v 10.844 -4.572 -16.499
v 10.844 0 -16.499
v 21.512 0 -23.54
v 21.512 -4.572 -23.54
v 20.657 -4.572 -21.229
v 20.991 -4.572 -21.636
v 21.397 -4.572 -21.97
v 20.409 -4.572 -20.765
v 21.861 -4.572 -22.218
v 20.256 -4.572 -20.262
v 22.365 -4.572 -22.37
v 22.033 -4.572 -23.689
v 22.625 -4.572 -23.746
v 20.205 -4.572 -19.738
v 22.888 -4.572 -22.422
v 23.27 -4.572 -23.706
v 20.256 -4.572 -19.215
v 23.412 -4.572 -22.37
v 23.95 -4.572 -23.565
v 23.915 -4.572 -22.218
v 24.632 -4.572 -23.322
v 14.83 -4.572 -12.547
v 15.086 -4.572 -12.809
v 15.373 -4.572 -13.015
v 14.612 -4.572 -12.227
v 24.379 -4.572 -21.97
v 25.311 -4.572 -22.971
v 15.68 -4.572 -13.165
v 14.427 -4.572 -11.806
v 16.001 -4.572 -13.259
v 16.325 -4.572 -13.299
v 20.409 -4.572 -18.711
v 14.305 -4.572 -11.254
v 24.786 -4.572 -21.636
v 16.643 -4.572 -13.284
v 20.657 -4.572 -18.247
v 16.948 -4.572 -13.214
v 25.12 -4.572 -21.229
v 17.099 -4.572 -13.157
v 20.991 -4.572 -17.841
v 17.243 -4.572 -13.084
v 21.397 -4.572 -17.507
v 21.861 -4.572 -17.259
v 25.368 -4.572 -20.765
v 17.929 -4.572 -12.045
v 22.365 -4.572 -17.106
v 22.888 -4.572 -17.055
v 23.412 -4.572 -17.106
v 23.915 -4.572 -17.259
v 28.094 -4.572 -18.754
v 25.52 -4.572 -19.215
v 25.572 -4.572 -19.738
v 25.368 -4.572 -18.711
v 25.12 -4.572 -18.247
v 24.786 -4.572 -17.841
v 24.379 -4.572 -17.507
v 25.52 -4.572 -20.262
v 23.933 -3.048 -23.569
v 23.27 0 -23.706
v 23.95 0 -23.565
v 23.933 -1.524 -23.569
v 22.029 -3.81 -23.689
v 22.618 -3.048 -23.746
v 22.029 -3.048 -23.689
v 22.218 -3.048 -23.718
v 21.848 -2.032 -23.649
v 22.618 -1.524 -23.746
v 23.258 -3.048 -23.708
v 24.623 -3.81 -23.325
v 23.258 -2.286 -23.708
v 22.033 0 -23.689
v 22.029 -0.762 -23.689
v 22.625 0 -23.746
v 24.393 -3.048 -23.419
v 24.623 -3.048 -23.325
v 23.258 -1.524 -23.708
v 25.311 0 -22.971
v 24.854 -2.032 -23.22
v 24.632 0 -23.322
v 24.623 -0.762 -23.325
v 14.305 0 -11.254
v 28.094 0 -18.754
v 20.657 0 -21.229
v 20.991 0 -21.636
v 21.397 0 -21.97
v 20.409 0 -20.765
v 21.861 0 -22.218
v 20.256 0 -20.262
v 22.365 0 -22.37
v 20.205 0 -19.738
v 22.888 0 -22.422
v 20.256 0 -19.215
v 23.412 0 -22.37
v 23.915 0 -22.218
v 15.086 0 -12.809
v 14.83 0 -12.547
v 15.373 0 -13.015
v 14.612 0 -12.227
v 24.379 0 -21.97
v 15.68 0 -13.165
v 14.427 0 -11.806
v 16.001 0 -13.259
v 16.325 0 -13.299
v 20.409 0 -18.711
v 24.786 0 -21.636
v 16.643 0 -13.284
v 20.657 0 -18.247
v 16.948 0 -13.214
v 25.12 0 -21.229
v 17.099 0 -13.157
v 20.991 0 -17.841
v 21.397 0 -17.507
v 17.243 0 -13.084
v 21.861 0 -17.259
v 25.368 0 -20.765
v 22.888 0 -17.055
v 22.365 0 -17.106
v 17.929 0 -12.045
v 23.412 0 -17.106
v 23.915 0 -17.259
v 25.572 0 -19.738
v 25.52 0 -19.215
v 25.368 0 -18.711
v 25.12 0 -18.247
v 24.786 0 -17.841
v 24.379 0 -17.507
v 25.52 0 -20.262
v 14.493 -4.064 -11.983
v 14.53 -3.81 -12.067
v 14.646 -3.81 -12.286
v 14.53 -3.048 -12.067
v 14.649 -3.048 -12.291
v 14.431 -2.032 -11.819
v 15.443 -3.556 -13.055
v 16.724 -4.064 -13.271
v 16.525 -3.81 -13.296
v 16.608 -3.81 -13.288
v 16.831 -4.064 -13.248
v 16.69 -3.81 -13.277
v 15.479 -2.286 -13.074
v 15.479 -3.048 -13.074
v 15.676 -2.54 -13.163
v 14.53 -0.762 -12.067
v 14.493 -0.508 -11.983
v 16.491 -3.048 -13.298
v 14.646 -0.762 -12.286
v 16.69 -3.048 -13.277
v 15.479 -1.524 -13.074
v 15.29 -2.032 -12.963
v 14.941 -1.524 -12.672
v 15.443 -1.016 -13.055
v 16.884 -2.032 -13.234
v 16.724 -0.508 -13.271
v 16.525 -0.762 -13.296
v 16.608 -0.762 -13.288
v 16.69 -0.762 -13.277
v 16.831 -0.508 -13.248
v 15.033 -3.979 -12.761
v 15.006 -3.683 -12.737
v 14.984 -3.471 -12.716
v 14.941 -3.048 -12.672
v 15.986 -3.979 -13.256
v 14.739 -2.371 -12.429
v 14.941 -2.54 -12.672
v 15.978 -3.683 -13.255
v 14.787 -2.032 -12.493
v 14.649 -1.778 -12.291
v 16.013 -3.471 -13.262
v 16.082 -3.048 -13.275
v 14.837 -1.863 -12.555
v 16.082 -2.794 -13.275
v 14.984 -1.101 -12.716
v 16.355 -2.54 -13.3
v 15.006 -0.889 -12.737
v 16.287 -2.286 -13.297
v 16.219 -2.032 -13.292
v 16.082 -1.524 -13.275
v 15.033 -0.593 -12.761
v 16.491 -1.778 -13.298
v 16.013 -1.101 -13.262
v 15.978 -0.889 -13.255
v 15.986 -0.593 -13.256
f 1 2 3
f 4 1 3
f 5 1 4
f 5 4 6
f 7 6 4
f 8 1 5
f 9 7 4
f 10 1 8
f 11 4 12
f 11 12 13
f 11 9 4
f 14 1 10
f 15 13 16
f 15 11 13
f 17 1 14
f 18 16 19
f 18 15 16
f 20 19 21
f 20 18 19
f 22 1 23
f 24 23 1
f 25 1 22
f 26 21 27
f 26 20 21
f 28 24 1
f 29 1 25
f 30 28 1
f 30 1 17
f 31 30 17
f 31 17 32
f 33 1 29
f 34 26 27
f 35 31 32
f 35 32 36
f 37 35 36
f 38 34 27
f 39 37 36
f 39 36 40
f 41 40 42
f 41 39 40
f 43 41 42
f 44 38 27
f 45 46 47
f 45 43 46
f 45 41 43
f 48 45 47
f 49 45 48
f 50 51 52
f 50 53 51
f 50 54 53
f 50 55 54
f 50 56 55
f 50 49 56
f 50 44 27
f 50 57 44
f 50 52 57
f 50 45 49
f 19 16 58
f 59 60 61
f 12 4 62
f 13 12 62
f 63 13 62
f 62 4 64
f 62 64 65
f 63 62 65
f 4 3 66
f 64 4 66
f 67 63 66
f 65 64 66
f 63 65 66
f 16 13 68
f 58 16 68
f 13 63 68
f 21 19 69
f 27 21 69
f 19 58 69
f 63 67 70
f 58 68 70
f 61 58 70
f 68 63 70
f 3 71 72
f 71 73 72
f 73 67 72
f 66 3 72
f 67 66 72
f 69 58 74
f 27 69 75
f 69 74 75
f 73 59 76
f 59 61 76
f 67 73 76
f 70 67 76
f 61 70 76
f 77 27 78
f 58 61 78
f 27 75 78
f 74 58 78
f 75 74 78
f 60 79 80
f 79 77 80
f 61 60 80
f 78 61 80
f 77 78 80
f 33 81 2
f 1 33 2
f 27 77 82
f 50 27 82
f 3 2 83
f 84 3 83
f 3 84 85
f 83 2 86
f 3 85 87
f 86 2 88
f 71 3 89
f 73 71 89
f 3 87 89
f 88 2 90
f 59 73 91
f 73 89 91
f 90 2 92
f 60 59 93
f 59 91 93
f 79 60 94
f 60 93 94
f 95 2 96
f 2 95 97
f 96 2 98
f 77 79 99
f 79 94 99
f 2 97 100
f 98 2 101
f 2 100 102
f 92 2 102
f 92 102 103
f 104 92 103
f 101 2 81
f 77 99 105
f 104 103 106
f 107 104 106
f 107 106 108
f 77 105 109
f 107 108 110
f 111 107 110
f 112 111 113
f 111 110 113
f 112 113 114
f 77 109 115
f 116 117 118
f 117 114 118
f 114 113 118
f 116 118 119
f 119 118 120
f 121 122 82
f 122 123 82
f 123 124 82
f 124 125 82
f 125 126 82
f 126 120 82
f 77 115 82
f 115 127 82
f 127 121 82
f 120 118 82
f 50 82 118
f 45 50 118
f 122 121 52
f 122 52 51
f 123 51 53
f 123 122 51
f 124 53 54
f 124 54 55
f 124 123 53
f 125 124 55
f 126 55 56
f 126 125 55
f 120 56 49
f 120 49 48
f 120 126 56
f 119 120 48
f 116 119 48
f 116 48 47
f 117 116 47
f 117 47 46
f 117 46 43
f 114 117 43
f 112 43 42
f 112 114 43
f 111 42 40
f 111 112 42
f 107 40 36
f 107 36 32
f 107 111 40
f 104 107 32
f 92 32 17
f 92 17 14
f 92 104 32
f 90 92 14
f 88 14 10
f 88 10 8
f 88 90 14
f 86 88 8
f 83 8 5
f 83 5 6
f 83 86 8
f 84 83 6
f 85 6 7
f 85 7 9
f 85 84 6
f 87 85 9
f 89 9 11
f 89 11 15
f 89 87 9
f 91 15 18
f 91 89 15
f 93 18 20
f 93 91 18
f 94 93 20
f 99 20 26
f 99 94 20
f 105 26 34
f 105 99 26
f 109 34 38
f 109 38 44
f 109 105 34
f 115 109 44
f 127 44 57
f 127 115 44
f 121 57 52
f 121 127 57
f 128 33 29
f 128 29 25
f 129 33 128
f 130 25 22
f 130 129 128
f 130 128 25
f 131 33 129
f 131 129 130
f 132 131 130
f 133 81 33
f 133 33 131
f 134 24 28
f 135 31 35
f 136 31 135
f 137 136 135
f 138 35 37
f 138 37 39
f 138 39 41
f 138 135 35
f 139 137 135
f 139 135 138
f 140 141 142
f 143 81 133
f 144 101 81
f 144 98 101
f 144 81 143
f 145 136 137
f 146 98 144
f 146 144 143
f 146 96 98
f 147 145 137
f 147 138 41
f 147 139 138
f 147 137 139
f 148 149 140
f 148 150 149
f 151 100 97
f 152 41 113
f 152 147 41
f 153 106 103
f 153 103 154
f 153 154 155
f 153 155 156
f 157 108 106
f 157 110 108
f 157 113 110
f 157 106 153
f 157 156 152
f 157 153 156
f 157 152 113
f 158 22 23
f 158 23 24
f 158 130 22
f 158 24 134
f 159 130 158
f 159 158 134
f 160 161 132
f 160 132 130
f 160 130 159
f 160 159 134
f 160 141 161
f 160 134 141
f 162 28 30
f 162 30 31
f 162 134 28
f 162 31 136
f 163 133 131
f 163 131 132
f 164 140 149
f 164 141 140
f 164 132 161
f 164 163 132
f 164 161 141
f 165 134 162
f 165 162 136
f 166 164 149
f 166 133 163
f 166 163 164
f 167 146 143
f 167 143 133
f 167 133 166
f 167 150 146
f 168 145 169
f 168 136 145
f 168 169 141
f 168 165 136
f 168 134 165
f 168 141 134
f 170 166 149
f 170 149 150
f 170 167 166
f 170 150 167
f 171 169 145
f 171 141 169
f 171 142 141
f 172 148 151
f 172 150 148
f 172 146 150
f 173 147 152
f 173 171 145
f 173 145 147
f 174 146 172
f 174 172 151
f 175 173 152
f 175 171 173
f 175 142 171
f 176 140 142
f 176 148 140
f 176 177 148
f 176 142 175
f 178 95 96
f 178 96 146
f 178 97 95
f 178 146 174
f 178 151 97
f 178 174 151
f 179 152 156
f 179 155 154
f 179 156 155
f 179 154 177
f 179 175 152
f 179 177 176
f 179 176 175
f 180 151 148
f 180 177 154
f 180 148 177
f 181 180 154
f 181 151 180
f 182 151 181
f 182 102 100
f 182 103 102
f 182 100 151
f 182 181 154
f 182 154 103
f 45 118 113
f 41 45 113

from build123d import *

# Parameters (mm, degrees)
F0_R     = 2.683726
F1_DEPTH = 4.572


with BuildPart() as f1:
    # F0 (on Front) → F1 (new body)
    with BuildSketch(Plane.XZ):
        with BuildLine():
            Line((25.310985, -22.970802), (28.093947, -18.754418))
            Line((28.093947, -18.754418), (17.928825, -12.04508))
            Line((17.928825, -12.04508), (17.243224, -13.083814))
            add(Edge.make_bspline(
                [(14.305283, -11.253849), (14.527919, -13.088348), (16.233271, -13.663207), (17.243224, -13.083814)],
                knots=[0, 0, 0, 0, 3.461252, 3.461252, 3.461252, 3.461252], degree=3))
            Line((14.305283, -11.253849), (10.843506, -16.498686))
            Line((10.843506, -16.498686), (21.512225, -23.540416))
            add(Edge.make_bspline(
                [(21.512225, -23.540416), (22.463378, -23.924239), (23.950653, -23.793526), (25.310985, -22.970802)],
                knots=[0, 0, 0, 0, 3.841229, 3.841229, 3.841229, 3.841229], degree=3))
        make_face()
        with Locations((22.88826, -19.738317)):
            Circle(F0_R, mode=Mode.SUBTRACT)
    extrude(amount=F1_DEPTH)


solid = f1.part
